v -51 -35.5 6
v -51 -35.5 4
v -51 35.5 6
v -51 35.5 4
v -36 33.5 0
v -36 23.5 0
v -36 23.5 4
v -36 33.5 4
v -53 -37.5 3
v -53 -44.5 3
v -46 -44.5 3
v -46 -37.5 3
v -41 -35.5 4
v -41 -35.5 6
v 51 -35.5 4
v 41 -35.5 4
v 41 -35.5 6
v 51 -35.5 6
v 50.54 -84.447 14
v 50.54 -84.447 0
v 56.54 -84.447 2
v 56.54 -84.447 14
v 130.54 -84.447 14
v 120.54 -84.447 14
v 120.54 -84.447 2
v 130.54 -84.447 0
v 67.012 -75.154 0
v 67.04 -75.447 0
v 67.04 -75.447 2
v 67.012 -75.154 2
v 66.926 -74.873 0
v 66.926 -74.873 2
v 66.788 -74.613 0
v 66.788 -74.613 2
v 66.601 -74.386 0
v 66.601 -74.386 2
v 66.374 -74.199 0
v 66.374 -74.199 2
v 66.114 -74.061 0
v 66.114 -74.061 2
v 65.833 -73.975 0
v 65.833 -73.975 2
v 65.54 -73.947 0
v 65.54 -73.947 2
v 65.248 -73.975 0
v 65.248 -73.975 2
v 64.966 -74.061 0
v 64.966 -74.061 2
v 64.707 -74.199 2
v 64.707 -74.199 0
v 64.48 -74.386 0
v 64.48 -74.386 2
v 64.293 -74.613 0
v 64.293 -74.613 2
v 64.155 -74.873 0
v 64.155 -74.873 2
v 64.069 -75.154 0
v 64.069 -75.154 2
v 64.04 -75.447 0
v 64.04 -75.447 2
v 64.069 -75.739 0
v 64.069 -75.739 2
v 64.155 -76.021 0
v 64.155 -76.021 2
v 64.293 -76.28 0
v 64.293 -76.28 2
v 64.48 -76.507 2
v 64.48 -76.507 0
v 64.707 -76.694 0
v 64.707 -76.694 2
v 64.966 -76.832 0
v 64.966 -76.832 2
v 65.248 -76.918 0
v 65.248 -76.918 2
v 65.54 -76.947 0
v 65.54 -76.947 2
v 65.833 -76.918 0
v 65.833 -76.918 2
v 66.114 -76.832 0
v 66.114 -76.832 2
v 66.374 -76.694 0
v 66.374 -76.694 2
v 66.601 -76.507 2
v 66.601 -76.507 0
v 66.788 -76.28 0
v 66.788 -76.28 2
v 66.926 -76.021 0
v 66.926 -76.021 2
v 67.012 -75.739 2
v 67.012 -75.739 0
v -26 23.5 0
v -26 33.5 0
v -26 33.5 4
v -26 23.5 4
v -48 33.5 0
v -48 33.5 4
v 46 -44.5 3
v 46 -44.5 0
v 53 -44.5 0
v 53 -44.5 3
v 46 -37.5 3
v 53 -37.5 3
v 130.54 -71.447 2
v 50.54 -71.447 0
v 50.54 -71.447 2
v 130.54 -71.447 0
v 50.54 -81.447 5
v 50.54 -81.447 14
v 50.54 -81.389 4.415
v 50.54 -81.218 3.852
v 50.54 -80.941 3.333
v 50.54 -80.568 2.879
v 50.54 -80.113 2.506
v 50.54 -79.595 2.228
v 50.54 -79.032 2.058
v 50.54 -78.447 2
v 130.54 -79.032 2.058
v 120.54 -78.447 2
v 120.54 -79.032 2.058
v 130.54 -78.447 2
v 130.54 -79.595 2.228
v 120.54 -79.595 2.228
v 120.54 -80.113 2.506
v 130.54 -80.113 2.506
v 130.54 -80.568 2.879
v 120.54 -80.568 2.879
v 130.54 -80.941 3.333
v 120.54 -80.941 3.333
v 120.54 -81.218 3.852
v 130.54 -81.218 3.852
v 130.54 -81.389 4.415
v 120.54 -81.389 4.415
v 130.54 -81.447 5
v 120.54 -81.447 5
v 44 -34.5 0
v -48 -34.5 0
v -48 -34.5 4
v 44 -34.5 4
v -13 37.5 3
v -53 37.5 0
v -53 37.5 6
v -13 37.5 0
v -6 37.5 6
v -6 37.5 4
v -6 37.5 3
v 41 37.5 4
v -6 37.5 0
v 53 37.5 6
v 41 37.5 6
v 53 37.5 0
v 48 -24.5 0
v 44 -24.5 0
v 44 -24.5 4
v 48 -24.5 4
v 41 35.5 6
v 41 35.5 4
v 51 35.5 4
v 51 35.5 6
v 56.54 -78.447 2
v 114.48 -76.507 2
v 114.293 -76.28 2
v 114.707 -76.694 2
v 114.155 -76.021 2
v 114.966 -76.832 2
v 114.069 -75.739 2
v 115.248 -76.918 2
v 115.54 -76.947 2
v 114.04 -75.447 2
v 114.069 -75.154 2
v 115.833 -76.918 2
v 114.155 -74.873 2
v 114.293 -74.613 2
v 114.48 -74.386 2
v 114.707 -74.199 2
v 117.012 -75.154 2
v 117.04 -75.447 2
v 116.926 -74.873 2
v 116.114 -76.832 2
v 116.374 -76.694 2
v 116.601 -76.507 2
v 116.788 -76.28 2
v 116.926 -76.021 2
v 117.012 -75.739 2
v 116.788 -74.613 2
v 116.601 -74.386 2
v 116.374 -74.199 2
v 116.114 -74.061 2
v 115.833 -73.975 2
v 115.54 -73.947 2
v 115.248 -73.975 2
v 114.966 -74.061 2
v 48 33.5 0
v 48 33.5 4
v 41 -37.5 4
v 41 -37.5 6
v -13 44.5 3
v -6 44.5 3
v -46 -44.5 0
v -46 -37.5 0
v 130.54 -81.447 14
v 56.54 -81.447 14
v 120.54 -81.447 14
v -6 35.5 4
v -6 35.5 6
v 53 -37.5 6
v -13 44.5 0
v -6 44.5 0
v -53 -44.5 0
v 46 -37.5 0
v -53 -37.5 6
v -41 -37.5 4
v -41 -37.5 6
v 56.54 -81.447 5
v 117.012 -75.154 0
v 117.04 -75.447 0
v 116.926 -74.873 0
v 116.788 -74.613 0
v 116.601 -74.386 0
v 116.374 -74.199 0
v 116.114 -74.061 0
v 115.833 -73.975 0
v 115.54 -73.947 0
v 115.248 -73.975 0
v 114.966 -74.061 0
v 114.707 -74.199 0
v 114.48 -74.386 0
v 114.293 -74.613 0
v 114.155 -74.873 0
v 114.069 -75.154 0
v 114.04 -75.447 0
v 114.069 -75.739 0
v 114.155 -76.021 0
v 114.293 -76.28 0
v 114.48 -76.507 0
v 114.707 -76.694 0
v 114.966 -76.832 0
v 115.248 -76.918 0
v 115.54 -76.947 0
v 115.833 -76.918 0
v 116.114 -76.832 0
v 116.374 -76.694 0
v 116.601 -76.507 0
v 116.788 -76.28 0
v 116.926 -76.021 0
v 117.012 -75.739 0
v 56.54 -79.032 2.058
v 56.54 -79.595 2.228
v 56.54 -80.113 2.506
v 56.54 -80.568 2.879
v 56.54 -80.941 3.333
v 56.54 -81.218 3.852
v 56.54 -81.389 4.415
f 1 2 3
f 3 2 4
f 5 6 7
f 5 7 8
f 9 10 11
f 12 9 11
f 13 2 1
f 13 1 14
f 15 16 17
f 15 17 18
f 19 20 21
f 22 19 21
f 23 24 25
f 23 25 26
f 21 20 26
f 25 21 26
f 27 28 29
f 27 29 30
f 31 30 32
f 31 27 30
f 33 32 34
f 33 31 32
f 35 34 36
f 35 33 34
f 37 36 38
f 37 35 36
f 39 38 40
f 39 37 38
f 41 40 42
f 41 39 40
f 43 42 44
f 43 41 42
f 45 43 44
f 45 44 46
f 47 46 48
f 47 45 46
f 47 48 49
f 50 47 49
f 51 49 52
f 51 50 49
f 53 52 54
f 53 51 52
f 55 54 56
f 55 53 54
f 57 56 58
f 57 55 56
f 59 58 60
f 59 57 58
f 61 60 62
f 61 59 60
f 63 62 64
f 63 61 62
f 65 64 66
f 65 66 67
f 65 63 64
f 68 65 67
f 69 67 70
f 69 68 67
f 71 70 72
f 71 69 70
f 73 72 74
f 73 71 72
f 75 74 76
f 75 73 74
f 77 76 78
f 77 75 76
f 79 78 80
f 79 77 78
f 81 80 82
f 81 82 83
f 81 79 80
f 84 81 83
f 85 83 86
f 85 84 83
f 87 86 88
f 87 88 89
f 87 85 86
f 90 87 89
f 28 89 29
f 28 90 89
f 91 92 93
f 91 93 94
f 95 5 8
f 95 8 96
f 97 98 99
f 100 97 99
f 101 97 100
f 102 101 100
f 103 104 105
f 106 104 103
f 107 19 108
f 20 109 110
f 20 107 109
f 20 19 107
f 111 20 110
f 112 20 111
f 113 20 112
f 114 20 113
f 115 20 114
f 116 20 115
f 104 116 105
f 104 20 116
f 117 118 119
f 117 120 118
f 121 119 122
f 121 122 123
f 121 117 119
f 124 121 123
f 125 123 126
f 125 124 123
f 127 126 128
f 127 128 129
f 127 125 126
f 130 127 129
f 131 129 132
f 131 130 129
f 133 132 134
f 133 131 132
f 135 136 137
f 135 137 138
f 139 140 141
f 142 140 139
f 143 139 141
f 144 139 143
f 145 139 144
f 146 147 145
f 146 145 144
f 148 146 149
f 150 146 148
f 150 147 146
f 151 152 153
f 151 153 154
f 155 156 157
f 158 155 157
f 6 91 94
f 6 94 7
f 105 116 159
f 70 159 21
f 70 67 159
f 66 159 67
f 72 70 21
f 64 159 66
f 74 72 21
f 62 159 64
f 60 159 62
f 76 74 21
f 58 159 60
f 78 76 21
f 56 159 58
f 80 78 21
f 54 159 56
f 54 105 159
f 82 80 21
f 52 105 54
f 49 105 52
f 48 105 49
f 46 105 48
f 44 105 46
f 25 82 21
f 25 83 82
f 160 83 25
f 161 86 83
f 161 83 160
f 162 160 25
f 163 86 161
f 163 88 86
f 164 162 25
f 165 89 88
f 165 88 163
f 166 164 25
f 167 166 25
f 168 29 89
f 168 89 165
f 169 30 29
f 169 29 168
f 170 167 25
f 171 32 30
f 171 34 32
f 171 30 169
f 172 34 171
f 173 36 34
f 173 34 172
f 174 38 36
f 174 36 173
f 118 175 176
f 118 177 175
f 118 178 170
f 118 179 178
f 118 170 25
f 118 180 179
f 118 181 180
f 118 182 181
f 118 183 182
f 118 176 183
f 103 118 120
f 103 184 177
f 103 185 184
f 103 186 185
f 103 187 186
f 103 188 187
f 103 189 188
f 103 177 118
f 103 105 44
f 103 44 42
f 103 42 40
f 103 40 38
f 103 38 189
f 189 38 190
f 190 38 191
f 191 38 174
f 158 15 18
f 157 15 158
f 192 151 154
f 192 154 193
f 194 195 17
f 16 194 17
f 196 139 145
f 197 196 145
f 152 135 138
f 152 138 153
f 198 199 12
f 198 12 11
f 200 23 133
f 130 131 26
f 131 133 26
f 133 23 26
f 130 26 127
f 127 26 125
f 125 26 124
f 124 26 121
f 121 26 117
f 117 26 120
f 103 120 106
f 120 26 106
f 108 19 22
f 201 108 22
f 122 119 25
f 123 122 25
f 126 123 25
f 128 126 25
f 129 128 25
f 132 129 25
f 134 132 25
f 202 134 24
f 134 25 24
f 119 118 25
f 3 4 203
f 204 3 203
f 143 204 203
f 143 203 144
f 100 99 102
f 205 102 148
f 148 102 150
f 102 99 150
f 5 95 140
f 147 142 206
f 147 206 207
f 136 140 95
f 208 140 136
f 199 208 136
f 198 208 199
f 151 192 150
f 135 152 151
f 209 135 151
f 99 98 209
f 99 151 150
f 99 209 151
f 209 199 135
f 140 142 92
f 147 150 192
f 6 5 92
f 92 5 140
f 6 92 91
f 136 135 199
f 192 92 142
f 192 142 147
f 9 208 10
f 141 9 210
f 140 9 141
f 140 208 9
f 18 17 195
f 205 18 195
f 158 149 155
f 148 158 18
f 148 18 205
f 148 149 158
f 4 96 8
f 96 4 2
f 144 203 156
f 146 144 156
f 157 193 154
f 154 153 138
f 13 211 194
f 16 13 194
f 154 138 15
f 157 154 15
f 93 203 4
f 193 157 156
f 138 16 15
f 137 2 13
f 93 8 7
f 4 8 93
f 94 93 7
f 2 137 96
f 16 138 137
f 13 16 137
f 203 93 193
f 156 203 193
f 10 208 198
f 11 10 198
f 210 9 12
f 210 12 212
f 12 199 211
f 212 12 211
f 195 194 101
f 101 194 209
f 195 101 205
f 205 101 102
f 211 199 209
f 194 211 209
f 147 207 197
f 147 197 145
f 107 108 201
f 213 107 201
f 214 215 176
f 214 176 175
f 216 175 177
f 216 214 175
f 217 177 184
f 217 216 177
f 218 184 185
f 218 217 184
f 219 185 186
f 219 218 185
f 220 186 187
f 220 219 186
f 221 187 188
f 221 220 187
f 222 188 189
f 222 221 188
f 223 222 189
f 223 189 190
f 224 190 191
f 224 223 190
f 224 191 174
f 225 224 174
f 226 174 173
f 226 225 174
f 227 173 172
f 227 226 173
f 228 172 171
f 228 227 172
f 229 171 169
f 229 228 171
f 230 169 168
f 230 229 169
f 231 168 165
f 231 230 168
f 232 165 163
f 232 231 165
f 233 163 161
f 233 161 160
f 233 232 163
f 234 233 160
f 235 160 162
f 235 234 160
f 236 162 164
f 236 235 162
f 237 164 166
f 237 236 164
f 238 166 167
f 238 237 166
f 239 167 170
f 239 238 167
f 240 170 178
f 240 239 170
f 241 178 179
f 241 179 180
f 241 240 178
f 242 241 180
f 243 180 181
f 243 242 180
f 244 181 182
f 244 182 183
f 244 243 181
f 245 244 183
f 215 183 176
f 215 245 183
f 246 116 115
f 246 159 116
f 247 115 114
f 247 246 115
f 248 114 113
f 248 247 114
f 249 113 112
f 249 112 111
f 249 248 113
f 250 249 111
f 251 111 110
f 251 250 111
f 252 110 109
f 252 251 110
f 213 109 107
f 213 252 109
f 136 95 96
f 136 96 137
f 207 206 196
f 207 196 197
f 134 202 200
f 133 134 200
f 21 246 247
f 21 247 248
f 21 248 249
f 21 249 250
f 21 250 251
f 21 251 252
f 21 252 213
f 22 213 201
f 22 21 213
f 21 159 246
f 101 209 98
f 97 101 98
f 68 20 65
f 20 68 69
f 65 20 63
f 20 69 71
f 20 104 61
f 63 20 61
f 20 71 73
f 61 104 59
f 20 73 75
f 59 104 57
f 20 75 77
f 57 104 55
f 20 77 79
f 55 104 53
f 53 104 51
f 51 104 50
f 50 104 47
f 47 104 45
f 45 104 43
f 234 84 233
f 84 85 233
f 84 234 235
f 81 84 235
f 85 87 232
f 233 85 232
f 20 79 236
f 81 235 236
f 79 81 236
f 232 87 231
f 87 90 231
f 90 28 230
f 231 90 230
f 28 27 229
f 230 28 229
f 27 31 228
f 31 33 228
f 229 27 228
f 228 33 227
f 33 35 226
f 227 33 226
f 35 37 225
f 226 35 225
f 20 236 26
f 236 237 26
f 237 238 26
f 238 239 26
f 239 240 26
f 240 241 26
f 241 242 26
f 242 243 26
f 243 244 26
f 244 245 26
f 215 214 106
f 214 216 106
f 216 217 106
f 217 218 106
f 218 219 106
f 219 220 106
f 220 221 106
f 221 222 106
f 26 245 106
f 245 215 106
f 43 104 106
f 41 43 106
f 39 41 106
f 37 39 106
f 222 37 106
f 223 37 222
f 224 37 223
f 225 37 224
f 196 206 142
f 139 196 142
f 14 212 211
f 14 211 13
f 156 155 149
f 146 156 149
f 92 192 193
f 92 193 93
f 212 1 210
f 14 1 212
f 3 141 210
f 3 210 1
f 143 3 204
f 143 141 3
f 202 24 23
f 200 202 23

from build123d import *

# Parameters (mm, degrees)
F0_W      = 106
F0_H      = 75
F0_W_2    = 102
F0_H_2    = 71
F1_DEPTH  = 6
F2_W      = 102
F2_H      = 71
F3_DEPTH  = 4
F4_W      = 82
F4_H      = 2
F4_W_2    = 47
F5_DEPTH  = 2
F6_W      = 7
F6_H      = 7
F7_DEPTH  = 3
F8_W      = 80
F8_H      = 13
F8_R      = 1.5
F9_DEPTH  = 2
F10_W     = 10
F10_H     = 14
F10_W_2   = 6
F11_DEPTH = 3
F12_R     = 3


with BuildPart() as f1:
    # F0 (on Top) → F1 (new body)
    with BuildSketch(Plane.XY):
        Rectangle(F0_W, F0_H)
        Rectangle(F0_W_2, F0_H_2, mode=Mode.SUBTRACT)
    extrude(amount=F1_DEPTH)

    # F2 (on face) → F3 (join)
    with BuildSketch(Plane(origin=(0, 0, 0), x_dir=(1, 0, 0), z_dir=(0, 0, -1))):
        Rectangle(F2_W, F2_H)
        Polygon((-36, -33.5), (-48, -33.5), (-48, 34.5), (44, 34.5), (44, 24.5), (48, 24.5), (48, -33.5), (-26, -33.5), (-26, -23.5), (-36, -23.5), align=None, mode=Mode.SUBTRACT)
    extrude(amount=-F3_DEPTH)

    # F4 (on face) → F5 (cut)
    with BuildSketch(Plane.XY.offset(6)):
        with Locations((0, -36.5)):
            Rectangle(F4_W, F4_H)
        with Locations((17.5, 36.5)):
            Rectangle(F4_W_2, F4_H)
    extrude(amount=-F5_DEPTH, mode=Mode.SUBTRACT)

    # F6 (on face) → F7 (join)
    with BuildSketch(Plane(origin=(0, 0, 0), x_dir=(1, 0, 0), z_dir=(0, 0, -1))):
        with Locations((49.5, 41)):
            Rectangle(F6_W, F6_H)
        with Locations((-49.5, 41)):
            Rectangle(F6_W, F6_H)
        with Locations((-9.5, -41)):
            Rectangle(F6_W, F6_H)
    extrude(amount=-F7_DEPTH)


with BuildPart() as f9:
    # F8 (on Top) → F9 (new body)
    with BuildSketch(Plane.XY):
        with Locations((90.540446, -77.946569)):
            Rectangle(F8_W, F8_H)
        with Locations((65.540446, -75.446569)):
            Circle(F8_R, mode=Mode.SUBTRACT)
        with Locations((115.540446, -75.446569)):
            Circle(F8_R, mode=Mode.SUBTRACT)
    extrude(amount=F9_DEPTH)

    # F10 (on face) → F11 (join)
    with BuildSketch(Plane.XZ.offset(84.446569)):
        with Locations((125.540446, 7)):
            Rectangle(F10_W, F10_H)
        with Locations((53.540446, 7)):
            Rectangle(F10_W_2, F10_H)
    extrude(amount=-F11_DEPTH)

    # F12
    f12_edges = [f9.edges().sort_by_distance(p)[0] for p in [
        (53.540446, -81.446569, 2),
        (125.540446, -81.446569, 2),
    ]]
    fillet(f12_edges, radius=F12_R)


solid = Compound([f1.part, f9.part])
